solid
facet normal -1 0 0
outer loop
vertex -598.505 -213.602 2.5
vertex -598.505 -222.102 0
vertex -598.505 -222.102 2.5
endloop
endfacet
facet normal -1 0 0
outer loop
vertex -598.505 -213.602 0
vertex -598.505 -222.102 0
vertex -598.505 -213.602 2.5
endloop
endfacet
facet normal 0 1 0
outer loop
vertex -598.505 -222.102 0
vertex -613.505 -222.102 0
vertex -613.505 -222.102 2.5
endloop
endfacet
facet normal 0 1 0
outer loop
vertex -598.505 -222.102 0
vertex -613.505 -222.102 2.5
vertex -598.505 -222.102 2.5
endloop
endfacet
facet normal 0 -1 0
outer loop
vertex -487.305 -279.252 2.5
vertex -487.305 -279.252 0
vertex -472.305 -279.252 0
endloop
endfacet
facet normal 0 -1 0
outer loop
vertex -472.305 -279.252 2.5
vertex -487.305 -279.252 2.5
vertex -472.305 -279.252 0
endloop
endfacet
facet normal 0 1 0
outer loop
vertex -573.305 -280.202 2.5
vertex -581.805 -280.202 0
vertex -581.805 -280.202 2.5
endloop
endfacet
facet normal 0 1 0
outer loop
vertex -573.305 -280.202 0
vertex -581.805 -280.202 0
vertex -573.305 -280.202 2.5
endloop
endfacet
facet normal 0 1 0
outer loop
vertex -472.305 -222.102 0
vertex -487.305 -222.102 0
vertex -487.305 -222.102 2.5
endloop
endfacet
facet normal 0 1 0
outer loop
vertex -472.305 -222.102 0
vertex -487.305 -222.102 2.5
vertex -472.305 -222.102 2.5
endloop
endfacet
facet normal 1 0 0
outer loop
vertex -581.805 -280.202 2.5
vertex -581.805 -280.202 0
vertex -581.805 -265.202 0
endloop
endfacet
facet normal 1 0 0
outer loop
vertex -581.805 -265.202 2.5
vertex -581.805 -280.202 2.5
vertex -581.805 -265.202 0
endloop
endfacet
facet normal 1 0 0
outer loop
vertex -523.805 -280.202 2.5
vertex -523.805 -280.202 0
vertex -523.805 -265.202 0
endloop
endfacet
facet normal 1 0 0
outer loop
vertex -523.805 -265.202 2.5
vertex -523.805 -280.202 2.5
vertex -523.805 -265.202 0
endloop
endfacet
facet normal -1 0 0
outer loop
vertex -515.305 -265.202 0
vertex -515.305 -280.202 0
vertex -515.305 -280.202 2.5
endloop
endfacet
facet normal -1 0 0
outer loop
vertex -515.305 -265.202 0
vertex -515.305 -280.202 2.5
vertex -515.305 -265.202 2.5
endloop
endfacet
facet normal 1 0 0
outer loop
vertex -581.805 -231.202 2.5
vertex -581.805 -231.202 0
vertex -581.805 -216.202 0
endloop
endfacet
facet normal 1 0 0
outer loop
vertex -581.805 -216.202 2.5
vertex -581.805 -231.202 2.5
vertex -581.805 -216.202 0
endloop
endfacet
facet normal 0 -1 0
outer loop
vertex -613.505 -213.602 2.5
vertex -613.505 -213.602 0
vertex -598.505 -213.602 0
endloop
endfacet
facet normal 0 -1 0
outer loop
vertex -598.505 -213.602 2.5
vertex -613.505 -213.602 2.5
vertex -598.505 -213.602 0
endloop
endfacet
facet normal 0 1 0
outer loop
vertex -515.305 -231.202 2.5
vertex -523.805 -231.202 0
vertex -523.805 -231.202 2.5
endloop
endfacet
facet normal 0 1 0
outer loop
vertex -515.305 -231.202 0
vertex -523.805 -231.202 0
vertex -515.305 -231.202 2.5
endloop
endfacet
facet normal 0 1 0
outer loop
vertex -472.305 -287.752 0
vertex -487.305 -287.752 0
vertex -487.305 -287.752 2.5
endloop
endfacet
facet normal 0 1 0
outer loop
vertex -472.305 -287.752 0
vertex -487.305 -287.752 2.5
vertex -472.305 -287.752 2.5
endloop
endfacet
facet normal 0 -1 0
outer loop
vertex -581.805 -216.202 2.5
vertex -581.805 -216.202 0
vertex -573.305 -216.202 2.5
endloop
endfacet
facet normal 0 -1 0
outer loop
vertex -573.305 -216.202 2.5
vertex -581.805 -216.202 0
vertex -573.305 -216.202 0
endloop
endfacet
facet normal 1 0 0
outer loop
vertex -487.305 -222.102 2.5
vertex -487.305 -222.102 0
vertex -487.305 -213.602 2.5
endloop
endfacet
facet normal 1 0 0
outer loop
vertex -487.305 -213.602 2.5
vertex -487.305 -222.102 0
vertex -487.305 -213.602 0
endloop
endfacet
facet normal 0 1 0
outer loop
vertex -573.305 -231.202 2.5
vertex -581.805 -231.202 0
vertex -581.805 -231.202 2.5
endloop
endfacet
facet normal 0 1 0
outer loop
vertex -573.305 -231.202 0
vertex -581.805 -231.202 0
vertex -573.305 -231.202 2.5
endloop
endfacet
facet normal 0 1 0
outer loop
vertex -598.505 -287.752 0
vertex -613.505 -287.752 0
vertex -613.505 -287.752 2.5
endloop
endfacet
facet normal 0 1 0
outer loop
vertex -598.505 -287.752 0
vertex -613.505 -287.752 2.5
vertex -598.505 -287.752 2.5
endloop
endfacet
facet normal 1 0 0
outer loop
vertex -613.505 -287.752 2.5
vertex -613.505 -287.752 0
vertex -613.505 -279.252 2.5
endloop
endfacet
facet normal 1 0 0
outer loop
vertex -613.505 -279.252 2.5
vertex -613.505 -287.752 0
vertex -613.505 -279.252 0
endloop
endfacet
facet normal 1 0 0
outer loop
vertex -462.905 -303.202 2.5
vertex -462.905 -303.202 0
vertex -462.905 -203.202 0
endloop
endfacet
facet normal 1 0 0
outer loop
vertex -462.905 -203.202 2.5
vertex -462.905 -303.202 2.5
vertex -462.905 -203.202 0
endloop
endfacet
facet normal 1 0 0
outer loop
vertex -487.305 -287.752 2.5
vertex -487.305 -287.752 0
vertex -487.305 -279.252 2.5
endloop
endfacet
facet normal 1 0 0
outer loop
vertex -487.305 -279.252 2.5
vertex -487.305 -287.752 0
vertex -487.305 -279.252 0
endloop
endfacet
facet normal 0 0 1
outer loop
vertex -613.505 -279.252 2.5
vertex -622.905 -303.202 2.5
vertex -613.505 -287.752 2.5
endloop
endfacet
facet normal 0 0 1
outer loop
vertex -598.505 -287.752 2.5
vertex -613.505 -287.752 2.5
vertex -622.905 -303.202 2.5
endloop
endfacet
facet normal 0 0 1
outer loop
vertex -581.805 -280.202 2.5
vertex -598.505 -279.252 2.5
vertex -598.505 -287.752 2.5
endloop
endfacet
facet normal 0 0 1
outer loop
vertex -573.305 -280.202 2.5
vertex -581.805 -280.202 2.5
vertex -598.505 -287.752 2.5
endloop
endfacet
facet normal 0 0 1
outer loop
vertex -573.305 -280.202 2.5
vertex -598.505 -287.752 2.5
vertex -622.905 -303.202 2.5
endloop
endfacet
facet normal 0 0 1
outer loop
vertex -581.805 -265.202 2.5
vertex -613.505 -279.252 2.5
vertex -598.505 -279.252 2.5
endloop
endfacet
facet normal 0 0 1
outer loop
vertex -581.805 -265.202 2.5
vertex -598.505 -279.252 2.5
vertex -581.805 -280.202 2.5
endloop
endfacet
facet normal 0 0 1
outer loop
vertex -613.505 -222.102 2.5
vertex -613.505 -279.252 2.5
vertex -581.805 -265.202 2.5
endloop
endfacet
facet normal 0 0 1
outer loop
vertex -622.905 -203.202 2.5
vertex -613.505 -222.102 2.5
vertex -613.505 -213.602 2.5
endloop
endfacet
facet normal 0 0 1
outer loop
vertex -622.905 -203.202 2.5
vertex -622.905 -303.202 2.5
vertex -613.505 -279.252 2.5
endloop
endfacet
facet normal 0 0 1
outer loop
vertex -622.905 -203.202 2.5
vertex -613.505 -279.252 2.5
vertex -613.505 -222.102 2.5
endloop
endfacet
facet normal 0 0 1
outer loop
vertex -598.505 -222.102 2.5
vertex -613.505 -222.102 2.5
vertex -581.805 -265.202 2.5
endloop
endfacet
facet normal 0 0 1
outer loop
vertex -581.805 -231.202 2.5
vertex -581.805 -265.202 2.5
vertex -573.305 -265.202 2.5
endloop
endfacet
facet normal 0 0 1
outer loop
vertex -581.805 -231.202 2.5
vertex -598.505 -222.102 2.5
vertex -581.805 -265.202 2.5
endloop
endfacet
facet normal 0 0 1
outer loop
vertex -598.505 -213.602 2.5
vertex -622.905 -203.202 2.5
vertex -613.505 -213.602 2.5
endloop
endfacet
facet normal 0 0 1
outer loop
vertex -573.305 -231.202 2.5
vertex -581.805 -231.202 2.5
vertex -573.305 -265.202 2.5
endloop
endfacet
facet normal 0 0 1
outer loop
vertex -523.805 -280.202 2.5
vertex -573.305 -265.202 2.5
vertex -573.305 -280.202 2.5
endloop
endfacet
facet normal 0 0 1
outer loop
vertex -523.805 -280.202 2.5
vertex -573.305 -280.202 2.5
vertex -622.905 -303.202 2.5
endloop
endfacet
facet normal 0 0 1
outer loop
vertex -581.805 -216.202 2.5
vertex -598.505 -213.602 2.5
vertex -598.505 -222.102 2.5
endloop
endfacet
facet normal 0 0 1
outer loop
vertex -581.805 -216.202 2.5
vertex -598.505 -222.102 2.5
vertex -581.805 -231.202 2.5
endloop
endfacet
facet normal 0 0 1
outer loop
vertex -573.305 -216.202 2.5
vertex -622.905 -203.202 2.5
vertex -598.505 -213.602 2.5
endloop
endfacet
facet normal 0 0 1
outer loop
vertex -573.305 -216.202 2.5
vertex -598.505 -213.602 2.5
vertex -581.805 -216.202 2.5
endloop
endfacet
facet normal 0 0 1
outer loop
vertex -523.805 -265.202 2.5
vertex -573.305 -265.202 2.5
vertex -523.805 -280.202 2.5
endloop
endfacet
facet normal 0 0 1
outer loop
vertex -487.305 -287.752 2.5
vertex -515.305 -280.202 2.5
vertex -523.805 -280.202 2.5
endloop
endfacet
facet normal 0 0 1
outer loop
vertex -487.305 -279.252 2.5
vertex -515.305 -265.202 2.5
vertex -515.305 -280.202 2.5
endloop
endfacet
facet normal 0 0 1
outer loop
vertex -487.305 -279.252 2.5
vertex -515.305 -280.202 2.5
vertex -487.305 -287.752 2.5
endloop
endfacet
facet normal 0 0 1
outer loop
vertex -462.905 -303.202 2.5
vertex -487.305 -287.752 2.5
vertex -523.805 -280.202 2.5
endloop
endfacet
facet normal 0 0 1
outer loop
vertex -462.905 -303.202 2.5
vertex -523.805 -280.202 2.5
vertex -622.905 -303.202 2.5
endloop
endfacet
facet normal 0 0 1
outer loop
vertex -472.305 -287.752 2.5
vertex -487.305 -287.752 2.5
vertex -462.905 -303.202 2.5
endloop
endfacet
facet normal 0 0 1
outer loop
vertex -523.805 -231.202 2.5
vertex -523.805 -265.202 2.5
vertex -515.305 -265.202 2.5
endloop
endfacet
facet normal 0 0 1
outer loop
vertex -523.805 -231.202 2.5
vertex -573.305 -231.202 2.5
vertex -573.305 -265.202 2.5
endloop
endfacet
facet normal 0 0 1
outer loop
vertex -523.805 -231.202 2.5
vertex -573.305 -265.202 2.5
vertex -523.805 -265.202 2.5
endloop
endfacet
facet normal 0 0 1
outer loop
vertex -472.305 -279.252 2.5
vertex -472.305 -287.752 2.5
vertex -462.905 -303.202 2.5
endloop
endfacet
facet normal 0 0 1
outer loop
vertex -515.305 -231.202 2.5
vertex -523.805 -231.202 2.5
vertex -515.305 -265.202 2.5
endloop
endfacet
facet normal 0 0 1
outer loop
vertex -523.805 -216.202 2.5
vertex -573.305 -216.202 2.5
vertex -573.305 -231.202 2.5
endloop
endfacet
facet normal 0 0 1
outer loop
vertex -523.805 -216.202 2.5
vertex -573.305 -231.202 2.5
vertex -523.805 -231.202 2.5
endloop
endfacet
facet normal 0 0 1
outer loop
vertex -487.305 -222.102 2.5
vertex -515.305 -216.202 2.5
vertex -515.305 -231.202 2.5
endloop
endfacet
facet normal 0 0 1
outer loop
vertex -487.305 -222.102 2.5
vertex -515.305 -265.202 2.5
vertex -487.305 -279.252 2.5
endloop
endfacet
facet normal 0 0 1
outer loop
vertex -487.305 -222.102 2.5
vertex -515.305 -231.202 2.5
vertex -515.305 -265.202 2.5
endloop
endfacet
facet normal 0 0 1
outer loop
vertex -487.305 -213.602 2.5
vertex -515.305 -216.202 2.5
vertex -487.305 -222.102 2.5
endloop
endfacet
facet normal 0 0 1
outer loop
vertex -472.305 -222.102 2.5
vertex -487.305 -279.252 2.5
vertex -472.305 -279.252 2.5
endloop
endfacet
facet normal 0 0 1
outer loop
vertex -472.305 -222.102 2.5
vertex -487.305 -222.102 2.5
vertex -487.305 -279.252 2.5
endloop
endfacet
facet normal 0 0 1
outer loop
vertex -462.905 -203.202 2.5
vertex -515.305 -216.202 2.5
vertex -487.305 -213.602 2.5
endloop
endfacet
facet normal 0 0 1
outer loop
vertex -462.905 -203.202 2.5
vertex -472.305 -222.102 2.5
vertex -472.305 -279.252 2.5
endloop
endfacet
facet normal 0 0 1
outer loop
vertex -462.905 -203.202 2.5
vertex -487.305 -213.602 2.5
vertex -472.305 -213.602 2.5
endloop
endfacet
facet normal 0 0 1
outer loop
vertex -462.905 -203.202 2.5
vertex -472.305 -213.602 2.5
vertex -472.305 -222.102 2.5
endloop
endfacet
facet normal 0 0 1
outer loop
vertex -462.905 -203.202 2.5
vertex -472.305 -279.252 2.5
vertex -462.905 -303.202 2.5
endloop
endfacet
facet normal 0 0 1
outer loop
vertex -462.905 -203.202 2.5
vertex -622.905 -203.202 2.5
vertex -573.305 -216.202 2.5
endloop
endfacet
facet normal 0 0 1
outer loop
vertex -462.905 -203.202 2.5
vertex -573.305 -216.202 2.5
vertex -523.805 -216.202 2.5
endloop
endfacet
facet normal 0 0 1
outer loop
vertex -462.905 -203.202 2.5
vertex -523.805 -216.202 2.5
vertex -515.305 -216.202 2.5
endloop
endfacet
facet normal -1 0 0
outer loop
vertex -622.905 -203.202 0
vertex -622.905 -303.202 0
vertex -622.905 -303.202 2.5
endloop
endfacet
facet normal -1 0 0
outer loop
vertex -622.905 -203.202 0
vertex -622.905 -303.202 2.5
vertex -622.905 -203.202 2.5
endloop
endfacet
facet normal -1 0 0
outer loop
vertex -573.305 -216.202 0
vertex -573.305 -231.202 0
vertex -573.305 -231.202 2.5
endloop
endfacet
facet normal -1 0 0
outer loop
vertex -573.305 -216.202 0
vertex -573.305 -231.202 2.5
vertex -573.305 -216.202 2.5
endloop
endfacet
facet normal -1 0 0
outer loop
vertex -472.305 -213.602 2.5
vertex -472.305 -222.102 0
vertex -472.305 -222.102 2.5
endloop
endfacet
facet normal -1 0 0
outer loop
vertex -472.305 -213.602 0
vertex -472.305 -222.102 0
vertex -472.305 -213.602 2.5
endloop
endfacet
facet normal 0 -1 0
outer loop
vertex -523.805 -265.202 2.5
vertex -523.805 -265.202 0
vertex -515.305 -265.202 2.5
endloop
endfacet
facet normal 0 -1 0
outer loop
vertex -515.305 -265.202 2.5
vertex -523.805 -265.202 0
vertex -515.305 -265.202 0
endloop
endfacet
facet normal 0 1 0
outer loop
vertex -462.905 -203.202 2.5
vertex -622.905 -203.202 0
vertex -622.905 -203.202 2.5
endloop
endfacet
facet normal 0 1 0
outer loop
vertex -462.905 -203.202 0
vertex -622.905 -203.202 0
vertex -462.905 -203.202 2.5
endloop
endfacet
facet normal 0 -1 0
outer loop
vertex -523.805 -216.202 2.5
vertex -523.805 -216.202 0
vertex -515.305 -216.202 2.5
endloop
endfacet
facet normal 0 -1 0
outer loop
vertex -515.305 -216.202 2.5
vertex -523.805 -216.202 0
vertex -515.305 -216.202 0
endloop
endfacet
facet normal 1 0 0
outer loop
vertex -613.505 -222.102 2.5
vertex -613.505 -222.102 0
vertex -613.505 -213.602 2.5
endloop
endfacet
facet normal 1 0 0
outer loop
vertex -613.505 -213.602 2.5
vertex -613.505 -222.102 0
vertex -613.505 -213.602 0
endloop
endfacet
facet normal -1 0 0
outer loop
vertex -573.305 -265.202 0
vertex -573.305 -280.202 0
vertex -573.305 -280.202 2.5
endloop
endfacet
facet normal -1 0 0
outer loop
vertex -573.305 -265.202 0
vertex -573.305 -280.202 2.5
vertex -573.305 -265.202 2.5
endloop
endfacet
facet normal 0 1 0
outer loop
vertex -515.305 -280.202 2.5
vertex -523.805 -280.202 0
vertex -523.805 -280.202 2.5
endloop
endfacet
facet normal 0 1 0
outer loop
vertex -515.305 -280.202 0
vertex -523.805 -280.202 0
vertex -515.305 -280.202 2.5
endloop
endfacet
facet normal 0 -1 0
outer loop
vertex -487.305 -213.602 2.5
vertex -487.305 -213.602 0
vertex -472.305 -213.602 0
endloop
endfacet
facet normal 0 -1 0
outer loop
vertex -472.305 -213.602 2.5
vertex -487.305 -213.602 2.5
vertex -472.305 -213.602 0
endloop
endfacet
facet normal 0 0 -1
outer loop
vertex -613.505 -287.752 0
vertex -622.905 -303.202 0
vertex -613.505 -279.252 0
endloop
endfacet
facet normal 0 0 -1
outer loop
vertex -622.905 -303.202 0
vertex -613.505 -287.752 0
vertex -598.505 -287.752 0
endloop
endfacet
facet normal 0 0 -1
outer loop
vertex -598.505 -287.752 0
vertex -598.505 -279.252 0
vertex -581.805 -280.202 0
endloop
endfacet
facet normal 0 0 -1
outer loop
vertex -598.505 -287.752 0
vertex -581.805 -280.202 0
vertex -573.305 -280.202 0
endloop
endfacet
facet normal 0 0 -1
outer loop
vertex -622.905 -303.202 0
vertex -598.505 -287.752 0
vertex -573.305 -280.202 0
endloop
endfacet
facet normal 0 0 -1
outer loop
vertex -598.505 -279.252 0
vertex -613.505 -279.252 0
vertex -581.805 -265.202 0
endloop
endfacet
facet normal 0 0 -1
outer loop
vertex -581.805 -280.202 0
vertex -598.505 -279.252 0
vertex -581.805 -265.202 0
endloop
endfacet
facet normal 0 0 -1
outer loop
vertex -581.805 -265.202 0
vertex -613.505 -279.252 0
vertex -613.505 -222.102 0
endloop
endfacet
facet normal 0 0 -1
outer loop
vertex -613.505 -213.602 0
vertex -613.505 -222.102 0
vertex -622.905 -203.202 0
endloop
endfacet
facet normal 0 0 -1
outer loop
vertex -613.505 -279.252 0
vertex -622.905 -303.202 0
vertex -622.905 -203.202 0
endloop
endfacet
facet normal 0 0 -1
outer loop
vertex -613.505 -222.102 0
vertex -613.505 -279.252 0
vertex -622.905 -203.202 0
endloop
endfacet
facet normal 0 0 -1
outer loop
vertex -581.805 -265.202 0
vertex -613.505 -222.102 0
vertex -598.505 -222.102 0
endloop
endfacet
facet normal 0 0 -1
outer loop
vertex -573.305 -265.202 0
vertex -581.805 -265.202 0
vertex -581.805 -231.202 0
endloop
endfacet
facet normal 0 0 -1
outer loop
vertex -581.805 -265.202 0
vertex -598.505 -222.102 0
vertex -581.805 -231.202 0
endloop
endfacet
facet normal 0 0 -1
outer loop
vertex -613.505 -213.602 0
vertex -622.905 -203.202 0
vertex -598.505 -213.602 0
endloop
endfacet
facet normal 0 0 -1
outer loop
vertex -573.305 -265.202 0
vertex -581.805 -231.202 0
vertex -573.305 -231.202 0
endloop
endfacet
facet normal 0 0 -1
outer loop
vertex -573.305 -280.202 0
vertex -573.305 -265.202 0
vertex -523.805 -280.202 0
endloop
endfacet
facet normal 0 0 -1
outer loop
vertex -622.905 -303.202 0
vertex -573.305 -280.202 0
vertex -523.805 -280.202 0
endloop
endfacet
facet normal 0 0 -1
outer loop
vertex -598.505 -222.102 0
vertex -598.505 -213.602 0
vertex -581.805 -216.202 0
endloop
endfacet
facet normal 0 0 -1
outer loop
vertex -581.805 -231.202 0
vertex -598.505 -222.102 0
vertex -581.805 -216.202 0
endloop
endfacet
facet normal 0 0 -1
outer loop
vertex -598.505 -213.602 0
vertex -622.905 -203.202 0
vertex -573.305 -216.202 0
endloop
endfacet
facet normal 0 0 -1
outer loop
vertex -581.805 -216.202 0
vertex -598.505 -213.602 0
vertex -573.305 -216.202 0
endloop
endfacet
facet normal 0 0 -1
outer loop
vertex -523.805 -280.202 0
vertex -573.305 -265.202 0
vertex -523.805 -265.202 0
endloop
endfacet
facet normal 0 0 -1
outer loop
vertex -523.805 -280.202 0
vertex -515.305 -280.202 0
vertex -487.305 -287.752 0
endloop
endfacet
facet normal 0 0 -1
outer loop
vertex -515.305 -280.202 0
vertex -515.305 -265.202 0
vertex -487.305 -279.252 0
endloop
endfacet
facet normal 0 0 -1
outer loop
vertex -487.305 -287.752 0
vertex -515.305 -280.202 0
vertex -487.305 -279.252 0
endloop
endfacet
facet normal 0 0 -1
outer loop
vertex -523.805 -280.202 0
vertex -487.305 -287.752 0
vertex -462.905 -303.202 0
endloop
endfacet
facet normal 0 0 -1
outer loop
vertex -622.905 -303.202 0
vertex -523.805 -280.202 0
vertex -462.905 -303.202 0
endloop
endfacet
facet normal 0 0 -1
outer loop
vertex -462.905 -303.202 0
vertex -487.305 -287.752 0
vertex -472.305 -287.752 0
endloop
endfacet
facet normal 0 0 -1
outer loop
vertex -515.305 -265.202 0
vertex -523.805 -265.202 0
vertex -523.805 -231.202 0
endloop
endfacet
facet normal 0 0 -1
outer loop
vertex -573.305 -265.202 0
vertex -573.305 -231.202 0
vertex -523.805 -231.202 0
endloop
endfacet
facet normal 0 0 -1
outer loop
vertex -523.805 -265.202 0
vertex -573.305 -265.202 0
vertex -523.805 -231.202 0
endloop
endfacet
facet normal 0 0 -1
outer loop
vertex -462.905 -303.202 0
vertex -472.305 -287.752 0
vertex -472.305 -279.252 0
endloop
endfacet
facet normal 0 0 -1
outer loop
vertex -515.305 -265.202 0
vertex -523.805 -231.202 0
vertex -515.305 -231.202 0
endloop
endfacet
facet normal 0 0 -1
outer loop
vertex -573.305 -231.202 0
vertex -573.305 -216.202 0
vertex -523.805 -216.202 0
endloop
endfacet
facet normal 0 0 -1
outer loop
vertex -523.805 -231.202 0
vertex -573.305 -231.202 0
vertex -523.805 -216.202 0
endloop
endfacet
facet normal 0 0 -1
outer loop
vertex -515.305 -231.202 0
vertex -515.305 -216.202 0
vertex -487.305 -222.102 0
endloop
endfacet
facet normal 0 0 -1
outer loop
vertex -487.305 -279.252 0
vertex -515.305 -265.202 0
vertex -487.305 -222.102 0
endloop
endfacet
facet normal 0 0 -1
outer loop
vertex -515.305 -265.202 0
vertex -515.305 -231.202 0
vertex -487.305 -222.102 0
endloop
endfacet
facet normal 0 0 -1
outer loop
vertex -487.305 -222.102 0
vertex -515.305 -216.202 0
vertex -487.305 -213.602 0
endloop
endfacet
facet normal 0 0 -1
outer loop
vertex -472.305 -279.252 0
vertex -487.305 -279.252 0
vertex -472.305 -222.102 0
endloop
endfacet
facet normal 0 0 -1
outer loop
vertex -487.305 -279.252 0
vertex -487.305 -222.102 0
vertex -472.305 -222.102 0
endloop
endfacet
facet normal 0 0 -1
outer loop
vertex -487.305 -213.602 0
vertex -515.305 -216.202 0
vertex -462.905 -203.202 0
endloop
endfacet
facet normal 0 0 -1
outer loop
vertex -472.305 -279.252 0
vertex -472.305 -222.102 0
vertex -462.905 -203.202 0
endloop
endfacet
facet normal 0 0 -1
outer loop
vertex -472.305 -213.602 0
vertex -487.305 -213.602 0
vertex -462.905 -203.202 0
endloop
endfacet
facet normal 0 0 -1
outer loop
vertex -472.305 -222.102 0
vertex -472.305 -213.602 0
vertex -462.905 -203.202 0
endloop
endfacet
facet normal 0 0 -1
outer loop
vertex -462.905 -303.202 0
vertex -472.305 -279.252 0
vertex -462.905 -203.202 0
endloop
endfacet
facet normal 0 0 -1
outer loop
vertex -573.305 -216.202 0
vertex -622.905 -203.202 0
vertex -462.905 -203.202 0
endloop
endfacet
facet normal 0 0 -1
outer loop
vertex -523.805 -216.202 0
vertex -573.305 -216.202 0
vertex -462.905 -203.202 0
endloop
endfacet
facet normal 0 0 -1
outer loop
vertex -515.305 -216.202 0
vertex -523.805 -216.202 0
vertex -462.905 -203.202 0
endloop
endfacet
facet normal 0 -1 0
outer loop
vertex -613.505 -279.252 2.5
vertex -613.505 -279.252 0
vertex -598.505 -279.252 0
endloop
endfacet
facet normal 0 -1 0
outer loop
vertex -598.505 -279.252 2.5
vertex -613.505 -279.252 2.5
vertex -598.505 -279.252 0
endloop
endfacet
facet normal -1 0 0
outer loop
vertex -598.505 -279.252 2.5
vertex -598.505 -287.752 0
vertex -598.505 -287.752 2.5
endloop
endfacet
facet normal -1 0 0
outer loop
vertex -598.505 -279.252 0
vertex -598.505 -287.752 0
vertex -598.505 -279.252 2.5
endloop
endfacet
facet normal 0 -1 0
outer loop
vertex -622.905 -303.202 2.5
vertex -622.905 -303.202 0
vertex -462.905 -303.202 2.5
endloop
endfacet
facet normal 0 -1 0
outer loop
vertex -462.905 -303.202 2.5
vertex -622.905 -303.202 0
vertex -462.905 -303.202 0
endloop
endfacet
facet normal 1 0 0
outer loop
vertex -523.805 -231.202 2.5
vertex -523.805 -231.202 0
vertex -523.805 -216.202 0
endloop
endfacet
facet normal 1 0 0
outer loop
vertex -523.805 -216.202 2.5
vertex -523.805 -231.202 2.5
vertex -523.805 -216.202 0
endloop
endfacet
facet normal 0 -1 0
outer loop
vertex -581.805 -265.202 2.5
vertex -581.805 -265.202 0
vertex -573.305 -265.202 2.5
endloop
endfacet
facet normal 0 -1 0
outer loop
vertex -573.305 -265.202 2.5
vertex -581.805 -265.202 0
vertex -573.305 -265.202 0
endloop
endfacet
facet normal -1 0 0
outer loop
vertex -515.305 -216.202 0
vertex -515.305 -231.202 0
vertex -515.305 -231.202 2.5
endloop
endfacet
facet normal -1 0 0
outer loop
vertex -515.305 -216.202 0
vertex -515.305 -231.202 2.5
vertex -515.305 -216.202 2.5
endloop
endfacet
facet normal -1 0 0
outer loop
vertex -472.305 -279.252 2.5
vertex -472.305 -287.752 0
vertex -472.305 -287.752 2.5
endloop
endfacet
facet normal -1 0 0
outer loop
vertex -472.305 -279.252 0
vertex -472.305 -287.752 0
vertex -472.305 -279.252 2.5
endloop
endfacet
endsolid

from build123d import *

# Parameters (mm, degrees)
F0_W     = 160
F0_H     = 100
F0_W_2   = 15
F0_H_2   = 8.5
F0_W_3   = 8.5
F0_H_3   = 15
F1_DEPTH = 2.5


with BuildPart() as f1:
    # F0 (on Top) → F1 (new body)
    with BuildSketch(Plane.XY):
        with Locations((-542.905006, -253.202301)):
            Rectangle(F0_W, F0_H)
        with Locations((-606.005006, -283.502301)):
            Rectangle(F0_W_2, F0_H_2, mode=Mode.SUBTRACT)
        with Locations((-577.555006, -272.702301)):
            Rectangle(F0_W_3, F0_H_3, mode=Mode.SUBTRACT)
        with Locations((-479.805006, -283.502301)):
            Rectangle(F0_W_2, F0_H_2, mode=Mode.SUBTRACT)
        with Locations((-519.555006, -272.702301)):
            Rectangle(F0_W_3, F0_H_3, mode=Mode.SUBTRACT)
        with Locations((-606.005006, -217.852301)):
            Rectangle(F0_W_2, F0_H_2, mode=Mode.SUBTRACT)
        with Locations((-577.555006, -223.702301)):
            Rectangle(F0_W_3, F0_H_3, mode=Mode.SUBTRACT)
        with Locations((-519.555006, -223.702301)):
            Rectangle(F0_W_3, F0_H_3, mode=Mode.SUBTRACT)
        with Locations((-479.805006, -217.852301)):
            Rectangle(F0_W_2, F0_H_2, mode=Mode.SUBTRACT)
    extrude(amount=F1_DEPTH)


solid = f1.part
